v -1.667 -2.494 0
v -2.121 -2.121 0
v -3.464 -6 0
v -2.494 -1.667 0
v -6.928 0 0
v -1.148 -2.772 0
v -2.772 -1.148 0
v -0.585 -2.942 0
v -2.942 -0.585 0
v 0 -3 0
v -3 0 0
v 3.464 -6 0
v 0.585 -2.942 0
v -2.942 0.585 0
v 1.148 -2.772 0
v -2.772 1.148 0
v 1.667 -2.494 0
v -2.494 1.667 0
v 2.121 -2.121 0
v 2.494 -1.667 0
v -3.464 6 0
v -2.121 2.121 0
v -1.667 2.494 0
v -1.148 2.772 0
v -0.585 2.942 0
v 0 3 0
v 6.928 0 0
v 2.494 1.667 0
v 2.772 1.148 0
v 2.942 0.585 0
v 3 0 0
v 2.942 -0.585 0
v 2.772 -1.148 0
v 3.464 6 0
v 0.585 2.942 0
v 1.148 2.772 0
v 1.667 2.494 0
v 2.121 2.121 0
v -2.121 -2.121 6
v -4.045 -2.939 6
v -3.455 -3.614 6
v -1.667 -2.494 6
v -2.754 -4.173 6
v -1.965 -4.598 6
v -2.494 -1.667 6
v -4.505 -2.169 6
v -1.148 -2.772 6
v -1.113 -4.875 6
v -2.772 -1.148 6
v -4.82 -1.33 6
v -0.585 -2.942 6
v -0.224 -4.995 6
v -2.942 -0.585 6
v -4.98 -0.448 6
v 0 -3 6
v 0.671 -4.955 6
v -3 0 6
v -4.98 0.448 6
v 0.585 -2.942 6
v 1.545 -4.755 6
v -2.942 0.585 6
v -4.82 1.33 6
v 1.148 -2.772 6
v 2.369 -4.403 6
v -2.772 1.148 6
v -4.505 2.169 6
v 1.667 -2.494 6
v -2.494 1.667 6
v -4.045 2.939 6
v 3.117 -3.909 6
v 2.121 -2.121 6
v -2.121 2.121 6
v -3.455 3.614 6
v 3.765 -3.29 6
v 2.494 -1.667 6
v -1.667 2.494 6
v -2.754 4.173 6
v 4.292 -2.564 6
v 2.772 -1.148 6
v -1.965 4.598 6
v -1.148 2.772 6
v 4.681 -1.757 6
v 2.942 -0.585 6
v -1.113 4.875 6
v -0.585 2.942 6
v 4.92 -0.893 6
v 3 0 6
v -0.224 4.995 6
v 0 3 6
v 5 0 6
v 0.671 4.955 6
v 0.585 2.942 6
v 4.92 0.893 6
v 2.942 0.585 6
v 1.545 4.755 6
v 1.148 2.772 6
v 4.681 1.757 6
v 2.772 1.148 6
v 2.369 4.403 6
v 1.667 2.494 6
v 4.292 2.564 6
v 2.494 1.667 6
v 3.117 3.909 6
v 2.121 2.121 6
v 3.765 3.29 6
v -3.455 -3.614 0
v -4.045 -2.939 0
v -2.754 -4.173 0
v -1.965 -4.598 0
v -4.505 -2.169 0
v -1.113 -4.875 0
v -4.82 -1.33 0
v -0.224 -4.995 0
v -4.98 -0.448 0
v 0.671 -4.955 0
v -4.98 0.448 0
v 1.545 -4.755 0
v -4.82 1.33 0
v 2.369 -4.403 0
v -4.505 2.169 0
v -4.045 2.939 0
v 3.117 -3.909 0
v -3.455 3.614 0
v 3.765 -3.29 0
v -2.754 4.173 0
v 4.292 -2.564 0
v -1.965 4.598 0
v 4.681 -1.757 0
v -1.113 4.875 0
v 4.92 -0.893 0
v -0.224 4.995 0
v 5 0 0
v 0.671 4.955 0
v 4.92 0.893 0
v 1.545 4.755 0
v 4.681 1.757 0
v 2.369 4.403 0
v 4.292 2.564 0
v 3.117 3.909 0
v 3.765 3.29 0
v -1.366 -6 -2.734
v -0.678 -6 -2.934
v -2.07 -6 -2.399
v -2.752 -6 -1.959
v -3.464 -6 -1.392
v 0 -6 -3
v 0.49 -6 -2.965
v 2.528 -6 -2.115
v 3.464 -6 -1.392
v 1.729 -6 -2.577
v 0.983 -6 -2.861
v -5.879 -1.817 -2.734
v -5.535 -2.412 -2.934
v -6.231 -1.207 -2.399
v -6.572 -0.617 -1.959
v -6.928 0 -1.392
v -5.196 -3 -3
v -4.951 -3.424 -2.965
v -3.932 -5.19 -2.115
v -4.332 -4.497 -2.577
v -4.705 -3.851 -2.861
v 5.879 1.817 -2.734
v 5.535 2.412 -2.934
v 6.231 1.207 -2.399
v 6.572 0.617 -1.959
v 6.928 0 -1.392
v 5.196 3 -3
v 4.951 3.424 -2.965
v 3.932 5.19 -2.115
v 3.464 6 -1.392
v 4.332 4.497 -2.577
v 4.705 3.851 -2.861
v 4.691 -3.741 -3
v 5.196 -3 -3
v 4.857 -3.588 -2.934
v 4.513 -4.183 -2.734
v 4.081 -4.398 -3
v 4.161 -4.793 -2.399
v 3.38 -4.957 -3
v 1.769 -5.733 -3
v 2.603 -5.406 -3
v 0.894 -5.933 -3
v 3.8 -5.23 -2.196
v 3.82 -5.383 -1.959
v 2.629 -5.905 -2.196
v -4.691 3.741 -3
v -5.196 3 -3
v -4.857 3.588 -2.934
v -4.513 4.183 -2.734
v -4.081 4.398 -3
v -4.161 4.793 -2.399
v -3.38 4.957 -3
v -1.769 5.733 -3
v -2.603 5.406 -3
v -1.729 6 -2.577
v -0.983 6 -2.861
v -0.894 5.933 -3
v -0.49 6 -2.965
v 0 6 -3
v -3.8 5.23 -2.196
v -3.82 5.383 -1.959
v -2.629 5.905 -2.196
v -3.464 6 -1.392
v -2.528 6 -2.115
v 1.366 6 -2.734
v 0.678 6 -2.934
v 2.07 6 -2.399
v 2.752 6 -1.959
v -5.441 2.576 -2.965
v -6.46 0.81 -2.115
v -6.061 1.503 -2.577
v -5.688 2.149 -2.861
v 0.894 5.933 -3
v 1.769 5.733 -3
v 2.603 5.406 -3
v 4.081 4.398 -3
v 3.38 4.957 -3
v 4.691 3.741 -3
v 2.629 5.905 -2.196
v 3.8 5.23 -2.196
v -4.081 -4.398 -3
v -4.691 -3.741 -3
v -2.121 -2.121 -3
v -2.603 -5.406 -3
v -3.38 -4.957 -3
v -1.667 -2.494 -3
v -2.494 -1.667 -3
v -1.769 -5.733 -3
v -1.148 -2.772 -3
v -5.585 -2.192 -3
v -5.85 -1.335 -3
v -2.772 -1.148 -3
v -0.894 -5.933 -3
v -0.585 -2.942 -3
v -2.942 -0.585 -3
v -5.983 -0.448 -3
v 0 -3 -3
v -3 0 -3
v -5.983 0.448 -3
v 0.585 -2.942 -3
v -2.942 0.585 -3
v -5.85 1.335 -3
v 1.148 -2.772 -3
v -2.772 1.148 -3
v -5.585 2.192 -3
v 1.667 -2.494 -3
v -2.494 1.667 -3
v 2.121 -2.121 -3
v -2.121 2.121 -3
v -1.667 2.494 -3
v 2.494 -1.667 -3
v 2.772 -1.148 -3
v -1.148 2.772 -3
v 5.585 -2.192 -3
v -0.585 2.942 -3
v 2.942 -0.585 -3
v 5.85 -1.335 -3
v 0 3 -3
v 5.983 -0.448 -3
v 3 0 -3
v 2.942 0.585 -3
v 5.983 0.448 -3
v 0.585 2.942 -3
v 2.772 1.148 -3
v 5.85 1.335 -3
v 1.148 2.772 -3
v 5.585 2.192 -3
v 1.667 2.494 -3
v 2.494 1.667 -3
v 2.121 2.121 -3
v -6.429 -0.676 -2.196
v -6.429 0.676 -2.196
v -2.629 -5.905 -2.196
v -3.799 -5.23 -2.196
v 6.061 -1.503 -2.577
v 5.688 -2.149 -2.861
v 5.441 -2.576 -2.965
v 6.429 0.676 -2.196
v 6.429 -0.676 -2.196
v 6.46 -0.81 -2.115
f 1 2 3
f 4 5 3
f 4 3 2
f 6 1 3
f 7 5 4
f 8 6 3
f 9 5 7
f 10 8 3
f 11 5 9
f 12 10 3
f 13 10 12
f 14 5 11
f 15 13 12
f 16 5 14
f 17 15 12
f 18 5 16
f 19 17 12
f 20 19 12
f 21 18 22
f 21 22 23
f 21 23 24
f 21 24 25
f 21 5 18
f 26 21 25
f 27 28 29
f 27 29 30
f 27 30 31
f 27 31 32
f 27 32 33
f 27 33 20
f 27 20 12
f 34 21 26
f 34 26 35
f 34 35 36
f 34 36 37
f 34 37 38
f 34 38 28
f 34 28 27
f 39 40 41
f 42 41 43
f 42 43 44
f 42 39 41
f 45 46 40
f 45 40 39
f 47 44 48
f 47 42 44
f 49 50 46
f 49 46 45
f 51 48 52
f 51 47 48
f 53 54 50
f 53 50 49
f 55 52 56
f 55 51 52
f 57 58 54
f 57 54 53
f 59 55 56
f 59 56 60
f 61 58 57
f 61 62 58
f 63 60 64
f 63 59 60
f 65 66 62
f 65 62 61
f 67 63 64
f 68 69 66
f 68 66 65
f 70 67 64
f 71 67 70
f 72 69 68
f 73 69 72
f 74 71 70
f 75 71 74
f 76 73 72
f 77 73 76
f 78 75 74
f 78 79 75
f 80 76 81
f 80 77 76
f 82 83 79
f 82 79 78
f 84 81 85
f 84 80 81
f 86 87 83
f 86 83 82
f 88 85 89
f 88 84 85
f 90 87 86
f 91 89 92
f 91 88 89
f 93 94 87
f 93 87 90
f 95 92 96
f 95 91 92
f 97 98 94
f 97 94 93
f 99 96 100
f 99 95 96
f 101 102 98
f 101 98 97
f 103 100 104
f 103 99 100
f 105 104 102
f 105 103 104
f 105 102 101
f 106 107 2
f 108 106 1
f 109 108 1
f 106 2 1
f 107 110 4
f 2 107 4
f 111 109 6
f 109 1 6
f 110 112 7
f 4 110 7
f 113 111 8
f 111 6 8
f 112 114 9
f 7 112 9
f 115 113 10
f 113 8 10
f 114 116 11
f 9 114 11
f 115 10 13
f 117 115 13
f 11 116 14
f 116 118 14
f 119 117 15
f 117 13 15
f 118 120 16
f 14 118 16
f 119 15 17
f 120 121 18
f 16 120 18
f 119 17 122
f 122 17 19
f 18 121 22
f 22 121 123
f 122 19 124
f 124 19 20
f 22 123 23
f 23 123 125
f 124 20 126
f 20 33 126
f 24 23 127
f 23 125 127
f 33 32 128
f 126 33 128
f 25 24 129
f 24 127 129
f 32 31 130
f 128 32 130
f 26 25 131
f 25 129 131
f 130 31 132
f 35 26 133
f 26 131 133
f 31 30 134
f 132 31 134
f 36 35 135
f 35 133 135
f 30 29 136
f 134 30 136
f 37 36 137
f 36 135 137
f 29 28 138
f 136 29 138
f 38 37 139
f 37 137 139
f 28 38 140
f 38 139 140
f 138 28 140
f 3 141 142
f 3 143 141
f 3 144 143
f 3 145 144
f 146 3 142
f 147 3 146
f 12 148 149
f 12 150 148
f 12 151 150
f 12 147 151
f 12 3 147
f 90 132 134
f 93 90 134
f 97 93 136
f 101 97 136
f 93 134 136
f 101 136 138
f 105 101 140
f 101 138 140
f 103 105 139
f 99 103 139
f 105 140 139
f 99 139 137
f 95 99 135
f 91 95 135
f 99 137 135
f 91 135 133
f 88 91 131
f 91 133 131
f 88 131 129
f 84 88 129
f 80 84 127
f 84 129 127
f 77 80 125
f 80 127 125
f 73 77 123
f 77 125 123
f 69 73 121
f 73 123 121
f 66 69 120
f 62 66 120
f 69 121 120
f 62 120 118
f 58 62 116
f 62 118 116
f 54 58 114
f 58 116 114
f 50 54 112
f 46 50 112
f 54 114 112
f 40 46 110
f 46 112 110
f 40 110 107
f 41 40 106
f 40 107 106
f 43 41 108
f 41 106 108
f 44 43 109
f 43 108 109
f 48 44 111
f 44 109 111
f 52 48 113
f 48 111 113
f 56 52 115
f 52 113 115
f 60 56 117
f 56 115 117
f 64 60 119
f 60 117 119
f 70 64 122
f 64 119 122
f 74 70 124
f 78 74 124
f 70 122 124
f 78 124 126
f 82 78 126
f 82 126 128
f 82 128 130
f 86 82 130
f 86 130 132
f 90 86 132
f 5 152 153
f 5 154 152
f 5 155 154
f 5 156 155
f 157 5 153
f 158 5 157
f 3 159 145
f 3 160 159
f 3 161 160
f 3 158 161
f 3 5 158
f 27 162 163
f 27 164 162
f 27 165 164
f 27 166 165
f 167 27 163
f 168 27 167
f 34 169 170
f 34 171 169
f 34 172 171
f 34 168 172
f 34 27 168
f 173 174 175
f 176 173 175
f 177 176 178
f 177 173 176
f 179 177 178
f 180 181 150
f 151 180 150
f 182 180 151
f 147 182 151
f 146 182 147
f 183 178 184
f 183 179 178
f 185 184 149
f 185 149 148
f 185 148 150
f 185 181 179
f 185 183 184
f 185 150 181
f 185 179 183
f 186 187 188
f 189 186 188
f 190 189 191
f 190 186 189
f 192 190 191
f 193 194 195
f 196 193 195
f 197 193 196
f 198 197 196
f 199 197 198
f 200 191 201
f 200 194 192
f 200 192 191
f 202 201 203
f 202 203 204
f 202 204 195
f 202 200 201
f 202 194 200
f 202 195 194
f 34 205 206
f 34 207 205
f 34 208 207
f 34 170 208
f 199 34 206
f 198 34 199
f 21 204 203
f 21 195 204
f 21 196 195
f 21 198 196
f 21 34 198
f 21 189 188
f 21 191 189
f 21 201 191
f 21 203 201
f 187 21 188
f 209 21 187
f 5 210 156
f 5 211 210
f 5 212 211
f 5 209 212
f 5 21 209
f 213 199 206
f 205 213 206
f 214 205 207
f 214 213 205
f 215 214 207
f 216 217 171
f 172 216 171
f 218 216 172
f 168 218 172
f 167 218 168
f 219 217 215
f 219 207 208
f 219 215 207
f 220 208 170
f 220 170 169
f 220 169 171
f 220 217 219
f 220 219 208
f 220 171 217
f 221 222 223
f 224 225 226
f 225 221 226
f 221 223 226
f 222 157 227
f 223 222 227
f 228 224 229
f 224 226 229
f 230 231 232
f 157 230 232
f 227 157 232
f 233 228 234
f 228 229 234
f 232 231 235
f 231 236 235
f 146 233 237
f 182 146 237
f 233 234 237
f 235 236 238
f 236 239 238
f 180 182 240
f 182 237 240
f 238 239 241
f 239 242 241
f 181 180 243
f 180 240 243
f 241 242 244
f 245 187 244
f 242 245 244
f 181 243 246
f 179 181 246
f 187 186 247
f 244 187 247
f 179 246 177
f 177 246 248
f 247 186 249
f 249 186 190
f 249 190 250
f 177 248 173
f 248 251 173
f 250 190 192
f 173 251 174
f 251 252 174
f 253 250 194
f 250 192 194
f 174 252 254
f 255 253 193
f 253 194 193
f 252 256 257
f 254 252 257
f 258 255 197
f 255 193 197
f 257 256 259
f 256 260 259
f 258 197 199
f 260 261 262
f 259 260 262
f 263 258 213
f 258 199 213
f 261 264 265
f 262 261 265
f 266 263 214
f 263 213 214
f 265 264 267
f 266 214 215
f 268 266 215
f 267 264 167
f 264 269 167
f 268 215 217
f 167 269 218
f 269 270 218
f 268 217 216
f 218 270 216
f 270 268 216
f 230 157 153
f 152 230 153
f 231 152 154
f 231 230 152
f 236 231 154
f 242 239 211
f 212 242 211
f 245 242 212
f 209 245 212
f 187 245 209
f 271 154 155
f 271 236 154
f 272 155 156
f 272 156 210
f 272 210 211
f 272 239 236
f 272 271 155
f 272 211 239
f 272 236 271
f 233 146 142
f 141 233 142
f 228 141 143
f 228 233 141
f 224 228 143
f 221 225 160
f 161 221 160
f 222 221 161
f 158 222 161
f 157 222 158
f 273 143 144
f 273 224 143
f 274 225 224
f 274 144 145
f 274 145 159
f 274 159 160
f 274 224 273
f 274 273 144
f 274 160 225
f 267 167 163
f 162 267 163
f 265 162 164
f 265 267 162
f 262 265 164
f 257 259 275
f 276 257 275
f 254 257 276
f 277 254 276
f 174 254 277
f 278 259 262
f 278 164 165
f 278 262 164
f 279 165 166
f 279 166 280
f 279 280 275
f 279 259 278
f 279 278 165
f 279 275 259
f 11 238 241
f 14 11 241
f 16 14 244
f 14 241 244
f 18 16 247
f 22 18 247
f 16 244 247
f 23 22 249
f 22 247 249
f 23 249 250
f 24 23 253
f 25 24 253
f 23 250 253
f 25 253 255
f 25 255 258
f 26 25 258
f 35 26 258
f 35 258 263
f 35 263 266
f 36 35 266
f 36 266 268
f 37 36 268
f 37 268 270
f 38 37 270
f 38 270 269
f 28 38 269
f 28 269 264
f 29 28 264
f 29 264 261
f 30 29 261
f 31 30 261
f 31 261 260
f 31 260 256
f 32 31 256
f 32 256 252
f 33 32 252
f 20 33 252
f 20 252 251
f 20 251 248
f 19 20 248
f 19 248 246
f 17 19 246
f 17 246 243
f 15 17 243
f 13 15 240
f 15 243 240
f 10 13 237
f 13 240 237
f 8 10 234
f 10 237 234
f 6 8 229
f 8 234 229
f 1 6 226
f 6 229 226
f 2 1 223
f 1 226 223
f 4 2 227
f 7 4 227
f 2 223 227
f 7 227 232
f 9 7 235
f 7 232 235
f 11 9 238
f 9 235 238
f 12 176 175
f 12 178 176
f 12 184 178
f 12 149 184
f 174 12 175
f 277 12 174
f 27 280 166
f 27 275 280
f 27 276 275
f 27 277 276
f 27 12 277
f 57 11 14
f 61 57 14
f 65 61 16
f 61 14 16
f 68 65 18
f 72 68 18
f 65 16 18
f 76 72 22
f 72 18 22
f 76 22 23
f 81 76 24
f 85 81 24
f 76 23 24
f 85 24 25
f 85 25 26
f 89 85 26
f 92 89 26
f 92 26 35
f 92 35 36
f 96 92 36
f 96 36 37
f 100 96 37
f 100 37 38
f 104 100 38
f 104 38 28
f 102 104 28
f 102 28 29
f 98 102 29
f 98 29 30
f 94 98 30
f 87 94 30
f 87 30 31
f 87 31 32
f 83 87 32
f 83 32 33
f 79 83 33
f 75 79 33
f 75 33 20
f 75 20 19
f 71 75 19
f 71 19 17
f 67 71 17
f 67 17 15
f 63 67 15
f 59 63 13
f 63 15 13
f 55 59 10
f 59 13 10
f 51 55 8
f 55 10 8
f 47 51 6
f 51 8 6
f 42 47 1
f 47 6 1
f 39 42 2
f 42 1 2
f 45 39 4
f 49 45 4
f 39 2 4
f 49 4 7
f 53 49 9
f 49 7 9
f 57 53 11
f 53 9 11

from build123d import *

# Parameters (mm, degrees)
SKETCH1_R           = 5
BOSS_EXTRUDE1_DEPTH = 6
BOSS_EXTRUDE2_DEPTH = 3
SKETCH2_R           = 3
CUT_EXTRUDE1_DEPTH  = 21
SKETCH4_OUTSIDE_W   = 66.706
SKETCH4_OUTSIDE_H   = 64.85
SKETCH4_OUTSIDE_R   = 6
CUT_EXTRUDE3_DEPTH  = 40.5
CUT_EXTRUDE3_DRAFT  = -30


with BuildPart() as part:
    # Sketch1 → Boss-Extrude1 (new body)
    with BuildSketch(Plane.XY):
        Circle(SKETCH1_R)
    extrude(amount=BOSS_EXTRUDE1_DEPTH)


with BuildPart() as body_2:
    # Sketch1<3> → Boss-Extrude2 (new body)
    with BuildSketch(Plane.XY):
        Polygon((3.464101615, -6), (6.92820323, 0), (3.464101615, 6), (-3.464101615, 6), (-6.92820323, 0), (-3.464101615, -6), align=None)
    extrude(amount=-BOSS_EXTRUDE2_DEPTH)


with BuildPart() as cut_extrude1_tool:
    # Sketch2 → Cut-Extrude1 (new body)
    with BuildSketch(Plane(origin=(0, 0, -3), x_dir=(-1, 0, 0), z_dir=(0, 0, -1))):
        Circle(SKETCH2_R)
    extrude(amount=-CUT_EXTRUDE1_DEPTH)


with BuildPart() as part_1:
    add(part.part)

    # Cut-Extrude1: cut by cut_extrude1_tool
    add(cut_extrude1_tool.part, mode=Mode.SUBTRACT)


with BuildPart() as body_2_1:
    add(body_2.part)

    # Cut-Extrude1: cut by cut_extrude1_tool
    add(cut_extrude1_tool.part, mode=Mode.SUBTRACT)


with BuildPart() as cut_extrude3_tool:
    # Sketch4 outside → Cut-Extrude3 (with draft: the straight prism first)
    with BuildSketch(Plane(origin=(0, 0, -3), x_dir=(-1, 0, 0), z_dir=(0, 0, -1))):
        Rectangle(SKETCH4_OUTSIDE_W, SKETCH4_OUTSIDE_H)
        Circle(SKETCH4_OUTSIDE_R, mode=Mode.SUBTRACT)
    extrude(amount=-CUT_EXTRUDE3_DEPTH)
    # Cut-Extrude3: the draft: its side faces are tilted about the plane it starts from
    cut_extrude3_sides = [cut_extrude3_tool.faces().sort_by_distance(p)[0] for p in [
        (0, -32.425, 17.25),
        (-33.353, 0, 17.25),
        (0, 32.425, 17.25),
        (33.353, 0, 17.25),
        (6, 0, 17.25),
    ]]
    draft(cut_extrude3_sides, Plane(origin=(0, 0, -3), x_dir=(-1, 0, 0), z_dir=(0, 0, -1)), CUT_EXTRUDE3_DRAFT)


with BuildPart() as body_2_2:
    add(body_2_1.part)

    # Cut-Extrude3: cut by cut_extrude3_tool
    add(cut_extrude3_tool.part, mode=Mode.SUBTRACT)


solid = Compound([part_1.part, body_2_2.part])
